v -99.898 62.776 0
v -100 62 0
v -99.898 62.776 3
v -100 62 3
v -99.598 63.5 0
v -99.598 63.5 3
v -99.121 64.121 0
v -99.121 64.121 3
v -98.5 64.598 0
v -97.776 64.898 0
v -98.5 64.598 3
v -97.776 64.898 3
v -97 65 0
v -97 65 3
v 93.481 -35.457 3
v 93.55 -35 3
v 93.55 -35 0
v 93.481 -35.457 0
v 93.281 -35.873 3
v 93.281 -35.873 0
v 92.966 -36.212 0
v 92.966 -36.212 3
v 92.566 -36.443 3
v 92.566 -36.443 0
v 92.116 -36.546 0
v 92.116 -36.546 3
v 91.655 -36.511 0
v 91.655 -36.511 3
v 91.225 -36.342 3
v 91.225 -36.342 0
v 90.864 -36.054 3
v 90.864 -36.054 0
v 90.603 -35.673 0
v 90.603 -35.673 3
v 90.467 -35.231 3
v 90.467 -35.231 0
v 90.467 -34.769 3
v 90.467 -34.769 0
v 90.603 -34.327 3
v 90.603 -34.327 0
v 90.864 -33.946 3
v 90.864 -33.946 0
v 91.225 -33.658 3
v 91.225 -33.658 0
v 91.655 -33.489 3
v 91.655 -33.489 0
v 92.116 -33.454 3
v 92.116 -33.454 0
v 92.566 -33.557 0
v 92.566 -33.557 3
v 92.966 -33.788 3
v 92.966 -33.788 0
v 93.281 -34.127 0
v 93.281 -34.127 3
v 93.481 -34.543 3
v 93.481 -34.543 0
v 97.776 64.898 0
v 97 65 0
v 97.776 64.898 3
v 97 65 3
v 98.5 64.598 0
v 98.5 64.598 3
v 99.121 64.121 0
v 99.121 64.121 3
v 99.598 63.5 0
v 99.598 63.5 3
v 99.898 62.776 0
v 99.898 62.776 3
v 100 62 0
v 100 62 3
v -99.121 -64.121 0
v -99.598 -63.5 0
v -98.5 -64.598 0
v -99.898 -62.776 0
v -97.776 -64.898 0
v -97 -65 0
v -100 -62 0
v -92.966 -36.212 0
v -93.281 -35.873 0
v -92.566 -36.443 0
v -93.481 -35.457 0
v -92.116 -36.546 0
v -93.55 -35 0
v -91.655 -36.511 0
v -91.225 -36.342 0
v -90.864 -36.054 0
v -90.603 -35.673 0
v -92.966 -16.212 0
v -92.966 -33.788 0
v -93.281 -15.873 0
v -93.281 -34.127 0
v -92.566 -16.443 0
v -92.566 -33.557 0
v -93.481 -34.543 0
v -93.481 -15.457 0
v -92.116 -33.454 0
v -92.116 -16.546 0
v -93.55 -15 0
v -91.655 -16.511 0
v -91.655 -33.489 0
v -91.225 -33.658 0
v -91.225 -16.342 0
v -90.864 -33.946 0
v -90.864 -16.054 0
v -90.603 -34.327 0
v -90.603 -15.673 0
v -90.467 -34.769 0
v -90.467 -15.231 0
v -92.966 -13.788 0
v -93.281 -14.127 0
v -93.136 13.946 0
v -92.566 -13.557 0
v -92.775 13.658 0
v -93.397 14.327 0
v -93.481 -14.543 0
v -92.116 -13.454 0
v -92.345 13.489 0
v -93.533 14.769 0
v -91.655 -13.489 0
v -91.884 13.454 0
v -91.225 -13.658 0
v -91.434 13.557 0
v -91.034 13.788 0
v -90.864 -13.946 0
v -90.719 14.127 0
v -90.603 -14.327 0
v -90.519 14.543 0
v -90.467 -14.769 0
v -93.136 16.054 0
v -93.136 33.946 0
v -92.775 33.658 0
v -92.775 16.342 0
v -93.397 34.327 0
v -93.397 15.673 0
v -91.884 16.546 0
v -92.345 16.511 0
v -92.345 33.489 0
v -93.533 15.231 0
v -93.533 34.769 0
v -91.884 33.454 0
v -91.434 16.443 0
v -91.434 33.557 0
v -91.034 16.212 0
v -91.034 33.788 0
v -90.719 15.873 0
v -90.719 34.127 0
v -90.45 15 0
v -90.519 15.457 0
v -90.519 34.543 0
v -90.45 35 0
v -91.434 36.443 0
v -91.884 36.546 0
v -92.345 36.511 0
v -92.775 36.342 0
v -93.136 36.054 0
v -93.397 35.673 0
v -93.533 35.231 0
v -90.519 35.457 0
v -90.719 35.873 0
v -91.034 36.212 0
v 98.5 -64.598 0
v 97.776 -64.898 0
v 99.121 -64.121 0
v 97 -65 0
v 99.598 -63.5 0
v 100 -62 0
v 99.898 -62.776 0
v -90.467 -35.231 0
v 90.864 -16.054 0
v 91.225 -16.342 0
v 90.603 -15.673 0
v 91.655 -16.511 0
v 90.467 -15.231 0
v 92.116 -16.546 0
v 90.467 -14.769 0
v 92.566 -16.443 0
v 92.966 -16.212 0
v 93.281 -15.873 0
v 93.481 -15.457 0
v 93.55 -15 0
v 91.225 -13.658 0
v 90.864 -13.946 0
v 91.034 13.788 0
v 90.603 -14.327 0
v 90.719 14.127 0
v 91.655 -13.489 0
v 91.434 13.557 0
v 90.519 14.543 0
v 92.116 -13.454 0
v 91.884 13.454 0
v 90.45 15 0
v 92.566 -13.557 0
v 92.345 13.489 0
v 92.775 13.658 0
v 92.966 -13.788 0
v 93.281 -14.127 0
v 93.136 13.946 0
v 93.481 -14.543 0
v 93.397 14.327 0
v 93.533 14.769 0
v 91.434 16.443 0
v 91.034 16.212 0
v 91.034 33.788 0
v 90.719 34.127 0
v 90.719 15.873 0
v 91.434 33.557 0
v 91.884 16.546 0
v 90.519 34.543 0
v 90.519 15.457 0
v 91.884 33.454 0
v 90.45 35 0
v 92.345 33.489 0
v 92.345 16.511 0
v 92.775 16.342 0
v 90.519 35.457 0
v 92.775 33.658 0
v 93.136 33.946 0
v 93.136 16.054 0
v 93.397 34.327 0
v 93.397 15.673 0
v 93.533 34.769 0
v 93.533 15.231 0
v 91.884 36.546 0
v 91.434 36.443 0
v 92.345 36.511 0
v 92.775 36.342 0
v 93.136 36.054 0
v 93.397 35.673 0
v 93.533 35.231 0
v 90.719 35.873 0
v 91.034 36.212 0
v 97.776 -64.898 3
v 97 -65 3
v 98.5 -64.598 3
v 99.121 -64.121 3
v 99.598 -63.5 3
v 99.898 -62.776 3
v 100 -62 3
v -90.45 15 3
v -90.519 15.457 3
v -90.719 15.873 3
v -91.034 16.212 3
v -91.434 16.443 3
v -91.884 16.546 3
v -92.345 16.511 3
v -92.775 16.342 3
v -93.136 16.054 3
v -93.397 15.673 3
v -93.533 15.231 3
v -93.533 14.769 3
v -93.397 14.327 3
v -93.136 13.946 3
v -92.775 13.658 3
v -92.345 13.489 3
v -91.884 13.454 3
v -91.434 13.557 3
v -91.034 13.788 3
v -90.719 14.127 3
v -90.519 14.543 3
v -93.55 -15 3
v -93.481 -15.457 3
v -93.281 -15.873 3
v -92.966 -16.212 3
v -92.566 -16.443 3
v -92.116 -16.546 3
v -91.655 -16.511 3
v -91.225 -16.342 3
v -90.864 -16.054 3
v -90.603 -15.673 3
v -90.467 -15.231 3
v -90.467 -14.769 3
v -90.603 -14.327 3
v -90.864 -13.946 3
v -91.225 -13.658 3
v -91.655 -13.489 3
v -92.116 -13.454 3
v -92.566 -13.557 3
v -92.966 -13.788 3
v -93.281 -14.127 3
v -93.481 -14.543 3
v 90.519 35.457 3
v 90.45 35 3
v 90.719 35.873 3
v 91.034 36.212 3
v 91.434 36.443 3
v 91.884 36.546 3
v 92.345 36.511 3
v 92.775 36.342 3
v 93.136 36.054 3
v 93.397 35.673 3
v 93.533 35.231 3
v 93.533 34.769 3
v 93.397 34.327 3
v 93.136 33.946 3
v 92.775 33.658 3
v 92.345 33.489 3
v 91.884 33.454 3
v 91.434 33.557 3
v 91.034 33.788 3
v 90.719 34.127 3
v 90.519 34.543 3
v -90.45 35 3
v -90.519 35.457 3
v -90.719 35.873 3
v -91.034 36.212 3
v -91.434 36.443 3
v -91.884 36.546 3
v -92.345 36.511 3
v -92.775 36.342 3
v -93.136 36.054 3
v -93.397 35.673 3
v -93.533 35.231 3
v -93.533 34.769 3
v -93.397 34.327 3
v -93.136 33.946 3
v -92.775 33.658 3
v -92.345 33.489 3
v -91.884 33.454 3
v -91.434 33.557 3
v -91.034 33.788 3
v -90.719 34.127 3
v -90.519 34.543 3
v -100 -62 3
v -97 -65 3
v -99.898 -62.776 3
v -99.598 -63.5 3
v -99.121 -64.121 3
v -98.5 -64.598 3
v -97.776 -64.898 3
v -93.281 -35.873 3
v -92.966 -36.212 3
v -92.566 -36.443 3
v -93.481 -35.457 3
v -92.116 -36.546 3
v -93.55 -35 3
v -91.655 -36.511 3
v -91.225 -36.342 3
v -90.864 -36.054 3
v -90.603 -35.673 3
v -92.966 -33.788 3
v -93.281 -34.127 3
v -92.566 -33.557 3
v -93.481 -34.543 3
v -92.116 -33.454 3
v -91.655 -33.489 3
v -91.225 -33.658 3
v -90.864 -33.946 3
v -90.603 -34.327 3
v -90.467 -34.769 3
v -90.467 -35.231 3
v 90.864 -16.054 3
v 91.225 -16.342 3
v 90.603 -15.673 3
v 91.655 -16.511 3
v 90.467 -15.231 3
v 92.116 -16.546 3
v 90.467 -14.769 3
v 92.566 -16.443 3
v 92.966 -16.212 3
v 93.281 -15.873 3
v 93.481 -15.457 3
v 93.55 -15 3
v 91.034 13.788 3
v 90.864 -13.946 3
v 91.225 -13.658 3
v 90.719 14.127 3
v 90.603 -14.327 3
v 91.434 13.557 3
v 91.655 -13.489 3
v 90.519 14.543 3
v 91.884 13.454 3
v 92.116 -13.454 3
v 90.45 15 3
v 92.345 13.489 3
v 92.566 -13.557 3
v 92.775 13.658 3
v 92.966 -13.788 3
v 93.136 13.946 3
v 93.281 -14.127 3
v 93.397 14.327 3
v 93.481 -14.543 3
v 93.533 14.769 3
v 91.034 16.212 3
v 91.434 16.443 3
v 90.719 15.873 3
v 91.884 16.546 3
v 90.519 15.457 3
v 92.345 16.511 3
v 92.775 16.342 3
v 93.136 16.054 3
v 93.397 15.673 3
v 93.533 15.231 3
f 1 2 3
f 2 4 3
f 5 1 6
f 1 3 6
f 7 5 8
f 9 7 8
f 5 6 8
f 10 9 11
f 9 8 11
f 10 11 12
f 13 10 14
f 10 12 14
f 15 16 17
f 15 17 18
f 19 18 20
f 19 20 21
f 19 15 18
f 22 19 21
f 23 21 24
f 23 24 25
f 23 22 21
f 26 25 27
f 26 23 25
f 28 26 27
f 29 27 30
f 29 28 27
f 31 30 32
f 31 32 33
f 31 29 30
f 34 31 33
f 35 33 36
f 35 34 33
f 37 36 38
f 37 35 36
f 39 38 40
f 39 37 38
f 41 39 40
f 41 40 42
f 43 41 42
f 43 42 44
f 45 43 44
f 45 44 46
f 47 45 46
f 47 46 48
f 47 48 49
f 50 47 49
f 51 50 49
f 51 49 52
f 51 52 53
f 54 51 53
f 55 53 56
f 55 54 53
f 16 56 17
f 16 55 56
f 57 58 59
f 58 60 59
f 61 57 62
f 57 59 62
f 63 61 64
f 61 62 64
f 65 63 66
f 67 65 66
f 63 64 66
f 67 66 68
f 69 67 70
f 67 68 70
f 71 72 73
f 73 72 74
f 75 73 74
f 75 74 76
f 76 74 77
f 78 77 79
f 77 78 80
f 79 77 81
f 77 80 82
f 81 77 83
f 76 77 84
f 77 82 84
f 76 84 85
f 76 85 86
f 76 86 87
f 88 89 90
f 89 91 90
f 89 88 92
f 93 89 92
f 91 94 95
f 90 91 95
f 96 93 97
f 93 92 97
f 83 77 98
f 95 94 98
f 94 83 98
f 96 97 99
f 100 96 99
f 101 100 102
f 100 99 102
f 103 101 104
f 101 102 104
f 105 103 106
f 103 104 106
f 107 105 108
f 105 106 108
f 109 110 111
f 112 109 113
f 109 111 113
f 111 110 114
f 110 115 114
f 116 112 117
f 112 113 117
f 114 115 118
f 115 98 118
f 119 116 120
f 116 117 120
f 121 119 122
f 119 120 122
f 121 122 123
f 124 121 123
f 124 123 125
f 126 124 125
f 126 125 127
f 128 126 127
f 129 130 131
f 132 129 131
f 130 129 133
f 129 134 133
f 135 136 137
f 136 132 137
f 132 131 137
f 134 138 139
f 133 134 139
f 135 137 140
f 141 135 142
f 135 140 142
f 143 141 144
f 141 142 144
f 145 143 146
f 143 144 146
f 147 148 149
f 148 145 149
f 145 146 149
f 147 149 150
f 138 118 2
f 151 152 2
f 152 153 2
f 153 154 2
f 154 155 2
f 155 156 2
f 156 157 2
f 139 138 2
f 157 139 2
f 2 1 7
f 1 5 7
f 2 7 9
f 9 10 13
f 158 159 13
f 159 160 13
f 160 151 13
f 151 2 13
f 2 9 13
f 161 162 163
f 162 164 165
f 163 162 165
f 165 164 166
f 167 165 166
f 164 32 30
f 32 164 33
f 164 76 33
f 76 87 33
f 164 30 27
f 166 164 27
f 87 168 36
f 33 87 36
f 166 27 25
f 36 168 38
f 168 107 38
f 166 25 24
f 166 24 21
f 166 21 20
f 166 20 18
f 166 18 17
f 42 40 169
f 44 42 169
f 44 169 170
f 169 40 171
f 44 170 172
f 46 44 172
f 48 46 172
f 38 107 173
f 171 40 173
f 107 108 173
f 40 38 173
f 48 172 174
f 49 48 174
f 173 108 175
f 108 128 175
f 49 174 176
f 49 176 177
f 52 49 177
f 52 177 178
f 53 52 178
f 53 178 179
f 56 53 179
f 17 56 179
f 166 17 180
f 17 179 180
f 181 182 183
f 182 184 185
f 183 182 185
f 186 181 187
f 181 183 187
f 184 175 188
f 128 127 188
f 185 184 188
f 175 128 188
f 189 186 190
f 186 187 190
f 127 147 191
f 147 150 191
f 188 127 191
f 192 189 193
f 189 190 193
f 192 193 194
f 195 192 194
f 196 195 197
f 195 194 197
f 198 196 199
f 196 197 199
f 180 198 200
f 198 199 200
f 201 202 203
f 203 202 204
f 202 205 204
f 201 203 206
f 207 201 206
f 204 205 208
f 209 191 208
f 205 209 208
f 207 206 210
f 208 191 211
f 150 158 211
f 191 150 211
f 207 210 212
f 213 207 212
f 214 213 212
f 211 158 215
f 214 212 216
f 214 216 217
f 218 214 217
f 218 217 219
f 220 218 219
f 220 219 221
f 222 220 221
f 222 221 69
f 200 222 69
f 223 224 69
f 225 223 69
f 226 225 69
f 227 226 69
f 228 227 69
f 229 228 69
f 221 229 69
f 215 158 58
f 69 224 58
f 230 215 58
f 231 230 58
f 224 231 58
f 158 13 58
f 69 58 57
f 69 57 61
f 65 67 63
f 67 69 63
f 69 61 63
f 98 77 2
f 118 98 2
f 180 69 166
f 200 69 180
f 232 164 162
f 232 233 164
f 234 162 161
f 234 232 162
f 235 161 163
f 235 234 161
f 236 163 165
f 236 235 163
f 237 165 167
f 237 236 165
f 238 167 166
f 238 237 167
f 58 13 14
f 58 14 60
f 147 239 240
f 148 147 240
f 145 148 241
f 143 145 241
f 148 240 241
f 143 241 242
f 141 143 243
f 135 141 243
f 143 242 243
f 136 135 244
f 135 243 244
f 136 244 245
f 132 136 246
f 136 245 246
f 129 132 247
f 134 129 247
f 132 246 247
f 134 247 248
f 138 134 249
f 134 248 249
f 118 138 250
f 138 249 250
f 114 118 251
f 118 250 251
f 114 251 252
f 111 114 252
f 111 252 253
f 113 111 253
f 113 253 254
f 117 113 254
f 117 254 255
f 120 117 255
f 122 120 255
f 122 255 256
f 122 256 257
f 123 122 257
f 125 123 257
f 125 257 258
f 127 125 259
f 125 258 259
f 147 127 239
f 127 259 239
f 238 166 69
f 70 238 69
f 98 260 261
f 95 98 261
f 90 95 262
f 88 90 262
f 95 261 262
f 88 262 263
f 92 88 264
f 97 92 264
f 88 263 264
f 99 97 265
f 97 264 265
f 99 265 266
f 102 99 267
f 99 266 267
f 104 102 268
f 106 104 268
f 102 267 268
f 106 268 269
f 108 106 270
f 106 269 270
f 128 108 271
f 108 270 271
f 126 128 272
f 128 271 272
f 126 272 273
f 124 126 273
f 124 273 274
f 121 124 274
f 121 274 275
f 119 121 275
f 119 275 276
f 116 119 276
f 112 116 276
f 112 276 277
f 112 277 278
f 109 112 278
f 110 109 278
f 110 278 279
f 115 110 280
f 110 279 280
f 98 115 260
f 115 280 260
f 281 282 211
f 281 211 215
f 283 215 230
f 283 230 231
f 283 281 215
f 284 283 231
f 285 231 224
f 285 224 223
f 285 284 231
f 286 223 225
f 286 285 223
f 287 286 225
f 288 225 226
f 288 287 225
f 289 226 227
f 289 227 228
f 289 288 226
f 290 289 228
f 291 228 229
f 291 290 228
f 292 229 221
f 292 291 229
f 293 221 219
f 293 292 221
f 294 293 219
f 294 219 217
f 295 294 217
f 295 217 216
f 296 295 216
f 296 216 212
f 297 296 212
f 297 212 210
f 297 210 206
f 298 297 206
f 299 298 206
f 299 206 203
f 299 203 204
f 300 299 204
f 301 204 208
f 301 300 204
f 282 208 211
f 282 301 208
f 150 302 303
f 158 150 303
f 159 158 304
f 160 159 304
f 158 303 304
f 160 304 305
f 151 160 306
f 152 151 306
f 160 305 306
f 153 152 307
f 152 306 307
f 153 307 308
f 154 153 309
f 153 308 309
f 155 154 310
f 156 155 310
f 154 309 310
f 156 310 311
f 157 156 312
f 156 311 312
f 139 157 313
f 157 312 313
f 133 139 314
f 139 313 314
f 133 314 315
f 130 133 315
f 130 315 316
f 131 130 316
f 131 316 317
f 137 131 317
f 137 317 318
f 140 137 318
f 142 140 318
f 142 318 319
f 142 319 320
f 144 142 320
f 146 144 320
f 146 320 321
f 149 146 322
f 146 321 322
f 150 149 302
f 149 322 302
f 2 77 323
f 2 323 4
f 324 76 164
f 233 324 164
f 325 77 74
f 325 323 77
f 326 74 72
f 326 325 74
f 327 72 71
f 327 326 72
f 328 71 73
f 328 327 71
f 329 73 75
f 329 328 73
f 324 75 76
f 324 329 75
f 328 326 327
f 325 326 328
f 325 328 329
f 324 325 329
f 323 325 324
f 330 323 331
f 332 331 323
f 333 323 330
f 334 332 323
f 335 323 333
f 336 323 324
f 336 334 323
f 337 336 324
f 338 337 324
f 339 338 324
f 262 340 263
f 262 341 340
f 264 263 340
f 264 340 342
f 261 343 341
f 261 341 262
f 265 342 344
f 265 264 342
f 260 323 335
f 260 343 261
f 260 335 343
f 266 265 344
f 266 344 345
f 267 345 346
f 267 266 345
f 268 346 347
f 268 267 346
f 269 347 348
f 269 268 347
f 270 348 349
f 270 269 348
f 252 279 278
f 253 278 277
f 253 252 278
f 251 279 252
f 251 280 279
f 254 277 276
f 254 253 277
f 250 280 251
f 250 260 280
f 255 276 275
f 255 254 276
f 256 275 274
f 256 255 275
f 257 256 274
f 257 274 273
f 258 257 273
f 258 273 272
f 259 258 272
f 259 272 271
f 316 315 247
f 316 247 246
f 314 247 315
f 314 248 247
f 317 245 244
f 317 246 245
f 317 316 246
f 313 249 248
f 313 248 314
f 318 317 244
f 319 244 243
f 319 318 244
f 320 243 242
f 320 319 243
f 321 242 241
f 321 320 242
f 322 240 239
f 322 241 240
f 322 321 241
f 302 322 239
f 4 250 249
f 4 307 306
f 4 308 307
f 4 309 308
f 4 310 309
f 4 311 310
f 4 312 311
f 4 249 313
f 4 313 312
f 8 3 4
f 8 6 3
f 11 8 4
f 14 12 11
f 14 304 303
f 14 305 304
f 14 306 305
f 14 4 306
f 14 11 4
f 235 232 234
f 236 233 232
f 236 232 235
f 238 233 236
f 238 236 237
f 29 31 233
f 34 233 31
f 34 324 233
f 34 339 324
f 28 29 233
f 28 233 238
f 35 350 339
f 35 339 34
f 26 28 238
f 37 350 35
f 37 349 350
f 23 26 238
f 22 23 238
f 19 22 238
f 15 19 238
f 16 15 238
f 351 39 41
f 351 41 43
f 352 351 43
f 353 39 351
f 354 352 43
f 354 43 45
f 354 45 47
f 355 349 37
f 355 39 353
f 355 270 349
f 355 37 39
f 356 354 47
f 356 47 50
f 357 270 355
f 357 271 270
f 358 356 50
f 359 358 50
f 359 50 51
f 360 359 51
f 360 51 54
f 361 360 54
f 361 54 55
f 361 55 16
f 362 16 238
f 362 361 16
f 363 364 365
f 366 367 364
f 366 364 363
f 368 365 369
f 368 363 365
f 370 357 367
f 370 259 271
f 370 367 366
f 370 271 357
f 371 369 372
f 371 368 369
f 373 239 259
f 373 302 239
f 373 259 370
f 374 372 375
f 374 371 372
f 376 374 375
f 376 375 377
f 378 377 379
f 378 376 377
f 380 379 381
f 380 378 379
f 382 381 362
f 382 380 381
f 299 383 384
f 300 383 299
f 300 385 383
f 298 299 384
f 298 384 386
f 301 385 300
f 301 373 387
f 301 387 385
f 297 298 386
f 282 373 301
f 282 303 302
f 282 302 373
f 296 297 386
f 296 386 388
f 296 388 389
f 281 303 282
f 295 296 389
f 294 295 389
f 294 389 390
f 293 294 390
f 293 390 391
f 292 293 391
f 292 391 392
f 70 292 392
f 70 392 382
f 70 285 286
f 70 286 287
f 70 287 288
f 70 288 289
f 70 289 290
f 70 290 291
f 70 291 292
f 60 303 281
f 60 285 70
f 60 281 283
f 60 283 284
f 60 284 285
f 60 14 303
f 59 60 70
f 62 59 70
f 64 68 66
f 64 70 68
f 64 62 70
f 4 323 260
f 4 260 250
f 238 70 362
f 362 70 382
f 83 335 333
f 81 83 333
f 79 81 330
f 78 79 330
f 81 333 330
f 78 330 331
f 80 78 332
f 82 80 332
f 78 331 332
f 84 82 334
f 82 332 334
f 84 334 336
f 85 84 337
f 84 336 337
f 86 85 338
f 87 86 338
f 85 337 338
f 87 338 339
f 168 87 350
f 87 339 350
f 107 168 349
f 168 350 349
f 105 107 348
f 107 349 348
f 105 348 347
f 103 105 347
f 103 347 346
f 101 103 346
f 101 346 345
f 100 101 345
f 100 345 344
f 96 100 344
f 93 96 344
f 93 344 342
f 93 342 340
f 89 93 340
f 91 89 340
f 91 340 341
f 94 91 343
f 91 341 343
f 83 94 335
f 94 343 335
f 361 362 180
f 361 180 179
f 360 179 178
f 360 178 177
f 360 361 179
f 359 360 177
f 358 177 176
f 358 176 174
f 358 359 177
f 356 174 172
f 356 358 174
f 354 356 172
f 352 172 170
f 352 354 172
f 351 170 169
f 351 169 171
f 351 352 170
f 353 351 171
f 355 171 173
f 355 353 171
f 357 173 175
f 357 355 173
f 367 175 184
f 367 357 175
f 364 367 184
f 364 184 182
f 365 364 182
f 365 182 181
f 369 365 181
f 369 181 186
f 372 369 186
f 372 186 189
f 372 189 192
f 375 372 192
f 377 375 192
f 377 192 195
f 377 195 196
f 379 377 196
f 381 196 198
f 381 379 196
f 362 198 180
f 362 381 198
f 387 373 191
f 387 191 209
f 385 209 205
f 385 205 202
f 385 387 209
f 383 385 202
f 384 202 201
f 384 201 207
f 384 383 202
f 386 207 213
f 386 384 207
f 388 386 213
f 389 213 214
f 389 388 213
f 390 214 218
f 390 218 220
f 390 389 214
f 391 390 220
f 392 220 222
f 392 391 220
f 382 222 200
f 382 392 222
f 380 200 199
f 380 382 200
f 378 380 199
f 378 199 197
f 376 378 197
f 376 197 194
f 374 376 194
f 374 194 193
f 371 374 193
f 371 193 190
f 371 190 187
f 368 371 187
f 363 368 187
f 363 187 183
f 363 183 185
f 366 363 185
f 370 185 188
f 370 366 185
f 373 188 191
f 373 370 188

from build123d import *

# Parameters (mm, degrees)
SKETCH_1_W          = 200
SKETCH_1_H          = 130
EXTRUDE_1_DEPTH     = 3
SKETCH_2_R          = 1.55
CUT_EXTRUDE_1_DEPTH = 3
FILLET_2_R          = 3


with BuildPart() as part:
    # 草图1 → 凸台-拉伸1 (new body)
    with BuildSketch(Plane.XY):
        Rectangle(SKETCH_1_W, SKETCH_1_H)
    extrude(amount=EXTRUDE_1_DEPTH)

    # 草图2 → 切除-拉伸1 (cut)
    with BuildSketch(Plane.XY.offset(3)):
        with Locations((-92, 35)):
            Circle(SKETCH_2_R)
        with Locations((-92, 15)):
            Circle(SKETCH_2_R)
        with Locations(Location((-92, -15, 0), (0, 0, 180))):
            Circle(SKETCH_2_R)
        with Locations(Location((-92, -35, 0), (0, 0, 180))):
            Circle(SKETCH_2_R)
    cut_extrude_1 = extrude(amount=-CUT_EXTRUDE_1_DEPTH, mode=Mode.SUBTRACT)

    # 镜向1: 切除-拉伸1 across plane
    add(cut_extrude_1.mirror(Plane(origin=(0, 0, 0), x_dir=(0, 0, 1), z_dir=(1, 0, 0))), mode=Mode.SUBTRACT)

    # 圆角2
    fillet_2_edges = [part.edges().sort_by_distance(p)[0] for p in [
        (100, -65, 1.5),
        (-100, -65, 1.5),
        (-100, 65, 1.5),
        (100, 65, 1.5),
    ]]
    fillet(fillet_2_edges, radius=FILLET_2_R)


solid = part.part
